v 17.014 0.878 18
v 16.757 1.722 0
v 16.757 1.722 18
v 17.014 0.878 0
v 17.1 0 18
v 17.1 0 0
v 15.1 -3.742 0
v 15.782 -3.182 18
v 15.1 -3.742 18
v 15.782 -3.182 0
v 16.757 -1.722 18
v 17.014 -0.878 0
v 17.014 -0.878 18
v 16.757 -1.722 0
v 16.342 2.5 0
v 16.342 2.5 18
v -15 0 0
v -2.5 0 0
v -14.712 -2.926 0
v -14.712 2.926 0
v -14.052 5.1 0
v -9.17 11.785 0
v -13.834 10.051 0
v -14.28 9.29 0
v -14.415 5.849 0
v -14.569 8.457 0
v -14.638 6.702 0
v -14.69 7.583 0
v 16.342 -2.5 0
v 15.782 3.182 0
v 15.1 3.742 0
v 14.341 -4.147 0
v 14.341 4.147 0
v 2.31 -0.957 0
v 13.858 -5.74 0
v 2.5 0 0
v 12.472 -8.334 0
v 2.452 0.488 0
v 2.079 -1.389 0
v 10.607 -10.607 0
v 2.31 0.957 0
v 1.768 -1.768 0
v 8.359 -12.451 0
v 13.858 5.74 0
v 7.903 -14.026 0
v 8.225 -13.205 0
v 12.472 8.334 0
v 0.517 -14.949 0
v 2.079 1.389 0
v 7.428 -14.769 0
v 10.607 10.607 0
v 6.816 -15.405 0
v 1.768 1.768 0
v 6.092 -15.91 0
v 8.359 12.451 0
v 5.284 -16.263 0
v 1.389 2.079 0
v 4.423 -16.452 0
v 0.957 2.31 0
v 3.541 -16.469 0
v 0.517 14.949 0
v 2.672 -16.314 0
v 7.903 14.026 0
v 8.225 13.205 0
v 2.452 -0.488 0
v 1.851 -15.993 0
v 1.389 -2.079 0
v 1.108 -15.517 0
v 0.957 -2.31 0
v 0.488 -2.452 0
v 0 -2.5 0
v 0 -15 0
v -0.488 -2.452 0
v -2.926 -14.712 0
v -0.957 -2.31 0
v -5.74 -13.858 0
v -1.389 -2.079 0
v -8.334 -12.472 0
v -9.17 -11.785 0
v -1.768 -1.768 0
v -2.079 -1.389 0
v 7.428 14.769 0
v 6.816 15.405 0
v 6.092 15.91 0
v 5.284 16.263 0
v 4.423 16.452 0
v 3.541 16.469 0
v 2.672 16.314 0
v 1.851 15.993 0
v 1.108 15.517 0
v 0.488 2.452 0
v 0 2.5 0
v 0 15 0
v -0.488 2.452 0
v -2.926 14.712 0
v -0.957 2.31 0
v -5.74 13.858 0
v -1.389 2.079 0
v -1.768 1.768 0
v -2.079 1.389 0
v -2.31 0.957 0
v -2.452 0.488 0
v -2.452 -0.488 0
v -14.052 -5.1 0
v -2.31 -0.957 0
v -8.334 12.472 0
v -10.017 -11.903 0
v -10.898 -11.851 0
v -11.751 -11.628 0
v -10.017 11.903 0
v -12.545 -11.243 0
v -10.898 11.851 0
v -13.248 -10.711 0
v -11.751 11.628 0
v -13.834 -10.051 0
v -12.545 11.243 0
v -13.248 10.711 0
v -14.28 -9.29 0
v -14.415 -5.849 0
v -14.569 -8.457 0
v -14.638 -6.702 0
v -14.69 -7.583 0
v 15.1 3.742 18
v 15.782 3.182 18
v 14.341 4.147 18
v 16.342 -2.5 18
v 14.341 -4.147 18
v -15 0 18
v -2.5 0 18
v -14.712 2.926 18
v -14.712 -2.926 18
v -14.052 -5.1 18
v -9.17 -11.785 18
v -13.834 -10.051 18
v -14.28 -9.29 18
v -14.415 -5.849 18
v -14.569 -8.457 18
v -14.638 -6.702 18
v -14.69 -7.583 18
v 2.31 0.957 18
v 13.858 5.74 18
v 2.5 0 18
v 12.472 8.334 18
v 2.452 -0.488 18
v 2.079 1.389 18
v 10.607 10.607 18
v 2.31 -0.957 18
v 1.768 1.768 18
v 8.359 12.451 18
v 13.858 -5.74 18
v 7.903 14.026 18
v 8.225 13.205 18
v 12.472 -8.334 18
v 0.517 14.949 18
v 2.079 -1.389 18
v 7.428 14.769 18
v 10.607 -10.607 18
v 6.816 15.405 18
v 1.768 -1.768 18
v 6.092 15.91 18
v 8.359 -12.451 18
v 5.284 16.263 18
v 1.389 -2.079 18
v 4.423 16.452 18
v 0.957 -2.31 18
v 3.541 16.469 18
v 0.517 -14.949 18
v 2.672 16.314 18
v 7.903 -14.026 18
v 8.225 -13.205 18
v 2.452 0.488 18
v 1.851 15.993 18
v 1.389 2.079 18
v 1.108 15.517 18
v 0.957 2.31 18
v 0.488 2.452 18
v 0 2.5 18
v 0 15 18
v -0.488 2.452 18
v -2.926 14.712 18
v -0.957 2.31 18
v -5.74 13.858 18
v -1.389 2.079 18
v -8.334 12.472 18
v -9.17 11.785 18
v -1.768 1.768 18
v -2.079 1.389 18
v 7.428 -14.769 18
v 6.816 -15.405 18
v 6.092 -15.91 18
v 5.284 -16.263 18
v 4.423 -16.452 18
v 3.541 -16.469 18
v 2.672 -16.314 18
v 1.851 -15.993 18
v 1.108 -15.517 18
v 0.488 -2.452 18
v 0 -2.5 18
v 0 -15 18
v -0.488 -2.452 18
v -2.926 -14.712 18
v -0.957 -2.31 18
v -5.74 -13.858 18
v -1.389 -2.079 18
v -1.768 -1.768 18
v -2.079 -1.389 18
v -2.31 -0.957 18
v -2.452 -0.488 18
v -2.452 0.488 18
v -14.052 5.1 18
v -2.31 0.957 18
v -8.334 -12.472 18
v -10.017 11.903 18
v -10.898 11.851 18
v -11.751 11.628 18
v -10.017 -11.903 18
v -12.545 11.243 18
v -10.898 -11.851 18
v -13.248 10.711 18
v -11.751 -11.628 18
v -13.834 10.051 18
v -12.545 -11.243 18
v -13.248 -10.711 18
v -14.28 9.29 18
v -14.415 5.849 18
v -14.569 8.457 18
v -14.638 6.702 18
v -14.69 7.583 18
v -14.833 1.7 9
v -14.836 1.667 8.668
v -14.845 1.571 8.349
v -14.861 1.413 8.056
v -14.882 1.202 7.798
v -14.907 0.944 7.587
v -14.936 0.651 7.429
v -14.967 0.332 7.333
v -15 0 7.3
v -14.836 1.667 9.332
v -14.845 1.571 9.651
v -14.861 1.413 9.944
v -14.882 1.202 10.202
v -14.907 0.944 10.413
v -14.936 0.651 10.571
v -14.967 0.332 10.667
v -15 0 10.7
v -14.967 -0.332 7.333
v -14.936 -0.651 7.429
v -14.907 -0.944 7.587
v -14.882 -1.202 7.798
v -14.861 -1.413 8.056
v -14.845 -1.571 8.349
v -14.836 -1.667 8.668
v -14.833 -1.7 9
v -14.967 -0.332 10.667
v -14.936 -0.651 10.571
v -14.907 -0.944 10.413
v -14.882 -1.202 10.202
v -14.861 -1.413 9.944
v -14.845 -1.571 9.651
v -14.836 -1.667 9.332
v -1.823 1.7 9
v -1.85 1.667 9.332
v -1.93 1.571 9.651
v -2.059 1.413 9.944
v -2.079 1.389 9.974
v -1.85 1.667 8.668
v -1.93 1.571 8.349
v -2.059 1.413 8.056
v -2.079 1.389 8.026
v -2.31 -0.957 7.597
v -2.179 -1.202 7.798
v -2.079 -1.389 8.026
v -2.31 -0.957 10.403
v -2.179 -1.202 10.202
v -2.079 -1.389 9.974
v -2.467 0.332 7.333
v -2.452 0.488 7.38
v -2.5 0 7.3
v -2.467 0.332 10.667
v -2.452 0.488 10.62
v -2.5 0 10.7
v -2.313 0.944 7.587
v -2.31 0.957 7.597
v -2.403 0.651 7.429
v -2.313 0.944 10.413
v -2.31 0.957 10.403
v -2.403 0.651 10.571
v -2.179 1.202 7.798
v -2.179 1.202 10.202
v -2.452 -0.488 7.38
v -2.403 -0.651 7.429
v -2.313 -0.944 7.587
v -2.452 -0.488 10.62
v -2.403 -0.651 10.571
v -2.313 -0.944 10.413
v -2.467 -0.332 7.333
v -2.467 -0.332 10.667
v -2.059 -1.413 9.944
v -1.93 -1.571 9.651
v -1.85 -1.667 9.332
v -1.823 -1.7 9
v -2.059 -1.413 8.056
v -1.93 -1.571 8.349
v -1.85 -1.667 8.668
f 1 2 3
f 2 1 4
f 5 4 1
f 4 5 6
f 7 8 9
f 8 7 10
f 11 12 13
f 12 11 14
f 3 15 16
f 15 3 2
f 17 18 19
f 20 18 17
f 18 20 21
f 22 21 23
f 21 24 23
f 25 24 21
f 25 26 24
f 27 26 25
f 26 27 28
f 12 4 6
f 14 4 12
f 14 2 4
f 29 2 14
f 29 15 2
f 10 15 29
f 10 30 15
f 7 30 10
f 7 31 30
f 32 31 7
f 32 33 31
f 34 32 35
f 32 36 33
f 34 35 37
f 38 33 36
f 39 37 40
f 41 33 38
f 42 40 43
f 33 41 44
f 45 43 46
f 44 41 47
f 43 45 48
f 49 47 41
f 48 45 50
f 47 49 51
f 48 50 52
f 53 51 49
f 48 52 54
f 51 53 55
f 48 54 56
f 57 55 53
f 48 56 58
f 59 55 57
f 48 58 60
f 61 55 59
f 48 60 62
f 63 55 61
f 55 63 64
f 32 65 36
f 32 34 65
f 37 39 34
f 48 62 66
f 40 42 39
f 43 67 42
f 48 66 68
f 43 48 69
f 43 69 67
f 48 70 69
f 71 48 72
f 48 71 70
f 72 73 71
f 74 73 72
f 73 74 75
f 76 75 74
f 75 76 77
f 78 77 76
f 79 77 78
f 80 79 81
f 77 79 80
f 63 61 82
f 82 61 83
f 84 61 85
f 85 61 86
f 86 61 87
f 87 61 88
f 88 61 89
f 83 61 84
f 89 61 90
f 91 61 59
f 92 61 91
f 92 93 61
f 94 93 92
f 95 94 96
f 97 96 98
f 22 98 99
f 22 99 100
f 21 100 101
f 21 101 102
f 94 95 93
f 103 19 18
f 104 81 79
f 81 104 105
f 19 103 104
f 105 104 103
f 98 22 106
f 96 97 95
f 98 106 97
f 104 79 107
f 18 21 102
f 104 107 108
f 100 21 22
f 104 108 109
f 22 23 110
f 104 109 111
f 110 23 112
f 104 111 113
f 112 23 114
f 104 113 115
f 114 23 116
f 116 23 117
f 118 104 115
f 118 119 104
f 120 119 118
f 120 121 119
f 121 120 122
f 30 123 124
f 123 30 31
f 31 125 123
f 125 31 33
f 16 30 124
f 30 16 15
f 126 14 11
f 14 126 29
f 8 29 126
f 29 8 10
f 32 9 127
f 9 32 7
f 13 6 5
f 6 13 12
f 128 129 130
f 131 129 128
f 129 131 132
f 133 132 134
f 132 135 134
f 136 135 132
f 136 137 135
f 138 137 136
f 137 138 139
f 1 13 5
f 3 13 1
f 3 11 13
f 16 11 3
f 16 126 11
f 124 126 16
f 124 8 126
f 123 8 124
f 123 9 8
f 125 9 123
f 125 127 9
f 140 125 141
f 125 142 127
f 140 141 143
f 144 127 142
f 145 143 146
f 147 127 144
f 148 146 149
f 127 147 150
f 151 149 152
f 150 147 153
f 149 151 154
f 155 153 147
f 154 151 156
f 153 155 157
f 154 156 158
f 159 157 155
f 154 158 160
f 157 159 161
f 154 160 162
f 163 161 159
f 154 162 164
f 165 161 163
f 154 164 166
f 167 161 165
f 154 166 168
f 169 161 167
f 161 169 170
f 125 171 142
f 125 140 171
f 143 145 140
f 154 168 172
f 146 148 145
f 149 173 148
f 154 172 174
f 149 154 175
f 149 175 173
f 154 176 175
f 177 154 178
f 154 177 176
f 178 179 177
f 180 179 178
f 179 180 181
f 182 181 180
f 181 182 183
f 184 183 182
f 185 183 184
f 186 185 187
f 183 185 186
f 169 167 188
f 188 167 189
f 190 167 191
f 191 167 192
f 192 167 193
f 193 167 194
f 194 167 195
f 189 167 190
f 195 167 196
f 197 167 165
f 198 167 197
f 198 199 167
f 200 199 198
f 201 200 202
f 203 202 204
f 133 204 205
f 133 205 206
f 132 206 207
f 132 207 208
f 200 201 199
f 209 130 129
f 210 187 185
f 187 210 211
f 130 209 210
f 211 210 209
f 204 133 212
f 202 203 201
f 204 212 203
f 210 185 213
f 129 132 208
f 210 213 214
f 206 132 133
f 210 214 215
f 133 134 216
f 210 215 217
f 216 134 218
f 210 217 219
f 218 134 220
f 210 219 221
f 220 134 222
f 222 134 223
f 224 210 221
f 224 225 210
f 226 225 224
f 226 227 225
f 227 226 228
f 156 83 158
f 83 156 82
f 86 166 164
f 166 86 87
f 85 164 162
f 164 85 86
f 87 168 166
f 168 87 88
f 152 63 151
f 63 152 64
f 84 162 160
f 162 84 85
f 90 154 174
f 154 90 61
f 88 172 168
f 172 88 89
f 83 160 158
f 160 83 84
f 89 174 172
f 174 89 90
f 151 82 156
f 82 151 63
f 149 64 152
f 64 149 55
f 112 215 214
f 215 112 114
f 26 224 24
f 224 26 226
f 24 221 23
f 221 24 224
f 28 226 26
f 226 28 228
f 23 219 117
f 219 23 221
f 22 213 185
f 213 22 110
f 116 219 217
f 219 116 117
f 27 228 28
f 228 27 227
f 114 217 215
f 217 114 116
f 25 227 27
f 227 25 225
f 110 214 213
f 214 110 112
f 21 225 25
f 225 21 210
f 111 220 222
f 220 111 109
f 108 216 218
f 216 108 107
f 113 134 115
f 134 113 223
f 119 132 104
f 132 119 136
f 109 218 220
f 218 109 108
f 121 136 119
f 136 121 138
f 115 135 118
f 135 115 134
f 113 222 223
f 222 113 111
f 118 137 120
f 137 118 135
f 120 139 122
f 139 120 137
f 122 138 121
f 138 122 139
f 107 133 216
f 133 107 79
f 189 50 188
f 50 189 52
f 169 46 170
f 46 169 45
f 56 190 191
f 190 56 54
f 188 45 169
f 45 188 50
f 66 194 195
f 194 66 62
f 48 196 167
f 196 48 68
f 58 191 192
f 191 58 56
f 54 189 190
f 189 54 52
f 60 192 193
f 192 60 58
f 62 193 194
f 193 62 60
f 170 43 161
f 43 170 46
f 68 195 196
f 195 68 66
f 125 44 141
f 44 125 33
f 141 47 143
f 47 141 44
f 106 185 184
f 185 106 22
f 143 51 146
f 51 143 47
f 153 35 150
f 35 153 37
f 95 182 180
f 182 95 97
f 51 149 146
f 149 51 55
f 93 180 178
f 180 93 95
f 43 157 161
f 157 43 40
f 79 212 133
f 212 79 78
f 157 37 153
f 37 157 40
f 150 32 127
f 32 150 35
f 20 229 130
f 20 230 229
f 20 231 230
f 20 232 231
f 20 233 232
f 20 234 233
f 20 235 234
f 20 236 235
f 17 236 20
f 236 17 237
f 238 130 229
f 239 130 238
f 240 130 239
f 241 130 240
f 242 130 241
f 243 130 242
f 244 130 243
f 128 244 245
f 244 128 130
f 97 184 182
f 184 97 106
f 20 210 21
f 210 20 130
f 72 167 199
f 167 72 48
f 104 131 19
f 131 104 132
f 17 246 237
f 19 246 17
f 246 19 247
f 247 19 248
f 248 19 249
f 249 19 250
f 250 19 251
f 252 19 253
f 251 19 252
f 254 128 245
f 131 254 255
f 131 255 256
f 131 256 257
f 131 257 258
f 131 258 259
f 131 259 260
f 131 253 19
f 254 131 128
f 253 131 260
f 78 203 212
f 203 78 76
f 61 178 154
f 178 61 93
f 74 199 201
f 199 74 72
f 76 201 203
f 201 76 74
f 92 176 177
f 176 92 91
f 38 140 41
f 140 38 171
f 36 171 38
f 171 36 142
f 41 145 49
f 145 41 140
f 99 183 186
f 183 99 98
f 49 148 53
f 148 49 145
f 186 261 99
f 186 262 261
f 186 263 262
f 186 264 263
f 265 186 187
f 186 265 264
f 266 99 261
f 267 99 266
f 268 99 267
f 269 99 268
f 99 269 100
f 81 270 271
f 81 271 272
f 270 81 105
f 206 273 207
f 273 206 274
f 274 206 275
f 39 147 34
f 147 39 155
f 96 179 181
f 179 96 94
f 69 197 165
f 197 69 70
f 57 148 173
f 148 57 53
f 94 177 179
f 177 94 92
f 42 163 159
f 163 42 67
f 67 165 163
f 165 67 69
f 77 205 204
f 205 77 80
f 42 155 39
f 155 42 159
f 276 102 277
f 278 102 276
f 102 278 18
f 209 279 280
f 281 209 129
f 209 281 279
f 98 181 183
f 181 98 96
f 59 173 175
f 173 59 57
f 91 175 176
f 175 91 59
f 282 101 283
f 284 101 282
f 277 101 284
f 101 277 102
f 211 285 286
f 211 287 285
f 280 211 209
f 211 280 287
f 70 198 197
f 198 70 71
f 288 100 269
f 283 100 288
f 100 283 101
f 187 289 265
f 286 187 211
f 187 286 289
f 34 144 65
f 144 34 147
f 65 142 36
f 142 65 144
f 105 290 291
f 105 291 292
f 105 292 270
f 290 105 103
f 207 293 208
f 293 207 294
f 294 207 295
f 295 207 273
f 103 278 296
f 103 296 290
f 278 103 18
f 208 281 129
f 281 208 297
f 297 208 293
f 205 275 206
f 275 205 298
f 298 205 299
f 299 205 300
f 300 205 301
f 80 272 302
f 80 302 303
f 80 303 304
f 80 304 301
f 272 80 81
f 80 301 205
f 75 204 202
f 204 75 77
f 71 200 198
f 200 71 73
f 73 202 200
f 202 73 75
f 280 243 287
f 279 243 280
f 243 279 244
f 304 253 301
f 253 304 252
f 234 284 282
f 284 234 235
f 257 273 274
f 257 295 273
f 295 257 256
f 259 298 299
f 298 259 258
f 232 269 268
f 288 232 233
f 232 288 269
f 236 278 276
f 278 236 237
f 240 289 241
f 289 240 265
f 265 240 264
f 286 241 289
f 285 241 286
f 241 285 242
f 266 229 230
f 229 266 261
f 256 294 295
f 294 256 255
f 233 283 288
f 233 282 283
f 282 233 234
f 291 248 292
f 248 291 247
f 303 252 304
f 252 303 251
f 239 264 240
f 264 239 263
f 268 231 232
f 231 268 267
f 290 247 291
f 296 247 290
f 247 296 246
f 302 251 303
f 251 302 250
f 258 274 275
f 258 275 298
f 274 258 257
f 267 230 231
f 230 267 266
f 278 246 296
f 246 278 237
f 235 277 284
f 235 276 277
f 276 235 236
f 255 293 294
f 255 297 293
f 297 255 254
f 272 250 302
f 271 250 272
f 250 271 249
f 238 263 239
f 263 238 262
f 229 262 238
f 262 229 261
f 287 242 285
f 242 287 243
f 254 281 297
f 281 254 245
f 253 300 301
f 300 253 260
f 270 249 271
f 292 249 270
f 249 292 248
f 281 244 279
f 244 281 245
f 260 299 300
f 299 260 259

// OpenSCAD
$fn = 32;

// ----------------------------------------------------------------------
// Hand knob: 30 x 30 x 18 mm
// ----------------------------------------------------------------------

// --- parameters (mm) ---
head_d = 30;              // knob diameter
head_h = 18;              // knob height
hole_d = 5;               // shaft bore
set_d = 3.4;              // set screw tap hole
notch_d = 1.24;           // knurl groove diameter
lobes = 5;                // grip lobes

module body() {
  cylinder(h = head_h, d = head_d);
  for (i = [0 : lobes - 1])
    rotate([0, 0, i * 360 / lobes])
      translate([head_d * 0.42, 0, 0])
        cylinder(h = head_h, d = head_d * 0.3);
}

difference() {
  union() {
    body();
  }
  translate([0, 0, -1]) cylinder(h = head_h + 0 + 2, d = hole_d);
  translate([-head_d / 2 - 1, 0, head_h * 0.5]) rotate([0, 90, 0]) cylinder(h = head_d / 2 + 2, d = set_d);
}
